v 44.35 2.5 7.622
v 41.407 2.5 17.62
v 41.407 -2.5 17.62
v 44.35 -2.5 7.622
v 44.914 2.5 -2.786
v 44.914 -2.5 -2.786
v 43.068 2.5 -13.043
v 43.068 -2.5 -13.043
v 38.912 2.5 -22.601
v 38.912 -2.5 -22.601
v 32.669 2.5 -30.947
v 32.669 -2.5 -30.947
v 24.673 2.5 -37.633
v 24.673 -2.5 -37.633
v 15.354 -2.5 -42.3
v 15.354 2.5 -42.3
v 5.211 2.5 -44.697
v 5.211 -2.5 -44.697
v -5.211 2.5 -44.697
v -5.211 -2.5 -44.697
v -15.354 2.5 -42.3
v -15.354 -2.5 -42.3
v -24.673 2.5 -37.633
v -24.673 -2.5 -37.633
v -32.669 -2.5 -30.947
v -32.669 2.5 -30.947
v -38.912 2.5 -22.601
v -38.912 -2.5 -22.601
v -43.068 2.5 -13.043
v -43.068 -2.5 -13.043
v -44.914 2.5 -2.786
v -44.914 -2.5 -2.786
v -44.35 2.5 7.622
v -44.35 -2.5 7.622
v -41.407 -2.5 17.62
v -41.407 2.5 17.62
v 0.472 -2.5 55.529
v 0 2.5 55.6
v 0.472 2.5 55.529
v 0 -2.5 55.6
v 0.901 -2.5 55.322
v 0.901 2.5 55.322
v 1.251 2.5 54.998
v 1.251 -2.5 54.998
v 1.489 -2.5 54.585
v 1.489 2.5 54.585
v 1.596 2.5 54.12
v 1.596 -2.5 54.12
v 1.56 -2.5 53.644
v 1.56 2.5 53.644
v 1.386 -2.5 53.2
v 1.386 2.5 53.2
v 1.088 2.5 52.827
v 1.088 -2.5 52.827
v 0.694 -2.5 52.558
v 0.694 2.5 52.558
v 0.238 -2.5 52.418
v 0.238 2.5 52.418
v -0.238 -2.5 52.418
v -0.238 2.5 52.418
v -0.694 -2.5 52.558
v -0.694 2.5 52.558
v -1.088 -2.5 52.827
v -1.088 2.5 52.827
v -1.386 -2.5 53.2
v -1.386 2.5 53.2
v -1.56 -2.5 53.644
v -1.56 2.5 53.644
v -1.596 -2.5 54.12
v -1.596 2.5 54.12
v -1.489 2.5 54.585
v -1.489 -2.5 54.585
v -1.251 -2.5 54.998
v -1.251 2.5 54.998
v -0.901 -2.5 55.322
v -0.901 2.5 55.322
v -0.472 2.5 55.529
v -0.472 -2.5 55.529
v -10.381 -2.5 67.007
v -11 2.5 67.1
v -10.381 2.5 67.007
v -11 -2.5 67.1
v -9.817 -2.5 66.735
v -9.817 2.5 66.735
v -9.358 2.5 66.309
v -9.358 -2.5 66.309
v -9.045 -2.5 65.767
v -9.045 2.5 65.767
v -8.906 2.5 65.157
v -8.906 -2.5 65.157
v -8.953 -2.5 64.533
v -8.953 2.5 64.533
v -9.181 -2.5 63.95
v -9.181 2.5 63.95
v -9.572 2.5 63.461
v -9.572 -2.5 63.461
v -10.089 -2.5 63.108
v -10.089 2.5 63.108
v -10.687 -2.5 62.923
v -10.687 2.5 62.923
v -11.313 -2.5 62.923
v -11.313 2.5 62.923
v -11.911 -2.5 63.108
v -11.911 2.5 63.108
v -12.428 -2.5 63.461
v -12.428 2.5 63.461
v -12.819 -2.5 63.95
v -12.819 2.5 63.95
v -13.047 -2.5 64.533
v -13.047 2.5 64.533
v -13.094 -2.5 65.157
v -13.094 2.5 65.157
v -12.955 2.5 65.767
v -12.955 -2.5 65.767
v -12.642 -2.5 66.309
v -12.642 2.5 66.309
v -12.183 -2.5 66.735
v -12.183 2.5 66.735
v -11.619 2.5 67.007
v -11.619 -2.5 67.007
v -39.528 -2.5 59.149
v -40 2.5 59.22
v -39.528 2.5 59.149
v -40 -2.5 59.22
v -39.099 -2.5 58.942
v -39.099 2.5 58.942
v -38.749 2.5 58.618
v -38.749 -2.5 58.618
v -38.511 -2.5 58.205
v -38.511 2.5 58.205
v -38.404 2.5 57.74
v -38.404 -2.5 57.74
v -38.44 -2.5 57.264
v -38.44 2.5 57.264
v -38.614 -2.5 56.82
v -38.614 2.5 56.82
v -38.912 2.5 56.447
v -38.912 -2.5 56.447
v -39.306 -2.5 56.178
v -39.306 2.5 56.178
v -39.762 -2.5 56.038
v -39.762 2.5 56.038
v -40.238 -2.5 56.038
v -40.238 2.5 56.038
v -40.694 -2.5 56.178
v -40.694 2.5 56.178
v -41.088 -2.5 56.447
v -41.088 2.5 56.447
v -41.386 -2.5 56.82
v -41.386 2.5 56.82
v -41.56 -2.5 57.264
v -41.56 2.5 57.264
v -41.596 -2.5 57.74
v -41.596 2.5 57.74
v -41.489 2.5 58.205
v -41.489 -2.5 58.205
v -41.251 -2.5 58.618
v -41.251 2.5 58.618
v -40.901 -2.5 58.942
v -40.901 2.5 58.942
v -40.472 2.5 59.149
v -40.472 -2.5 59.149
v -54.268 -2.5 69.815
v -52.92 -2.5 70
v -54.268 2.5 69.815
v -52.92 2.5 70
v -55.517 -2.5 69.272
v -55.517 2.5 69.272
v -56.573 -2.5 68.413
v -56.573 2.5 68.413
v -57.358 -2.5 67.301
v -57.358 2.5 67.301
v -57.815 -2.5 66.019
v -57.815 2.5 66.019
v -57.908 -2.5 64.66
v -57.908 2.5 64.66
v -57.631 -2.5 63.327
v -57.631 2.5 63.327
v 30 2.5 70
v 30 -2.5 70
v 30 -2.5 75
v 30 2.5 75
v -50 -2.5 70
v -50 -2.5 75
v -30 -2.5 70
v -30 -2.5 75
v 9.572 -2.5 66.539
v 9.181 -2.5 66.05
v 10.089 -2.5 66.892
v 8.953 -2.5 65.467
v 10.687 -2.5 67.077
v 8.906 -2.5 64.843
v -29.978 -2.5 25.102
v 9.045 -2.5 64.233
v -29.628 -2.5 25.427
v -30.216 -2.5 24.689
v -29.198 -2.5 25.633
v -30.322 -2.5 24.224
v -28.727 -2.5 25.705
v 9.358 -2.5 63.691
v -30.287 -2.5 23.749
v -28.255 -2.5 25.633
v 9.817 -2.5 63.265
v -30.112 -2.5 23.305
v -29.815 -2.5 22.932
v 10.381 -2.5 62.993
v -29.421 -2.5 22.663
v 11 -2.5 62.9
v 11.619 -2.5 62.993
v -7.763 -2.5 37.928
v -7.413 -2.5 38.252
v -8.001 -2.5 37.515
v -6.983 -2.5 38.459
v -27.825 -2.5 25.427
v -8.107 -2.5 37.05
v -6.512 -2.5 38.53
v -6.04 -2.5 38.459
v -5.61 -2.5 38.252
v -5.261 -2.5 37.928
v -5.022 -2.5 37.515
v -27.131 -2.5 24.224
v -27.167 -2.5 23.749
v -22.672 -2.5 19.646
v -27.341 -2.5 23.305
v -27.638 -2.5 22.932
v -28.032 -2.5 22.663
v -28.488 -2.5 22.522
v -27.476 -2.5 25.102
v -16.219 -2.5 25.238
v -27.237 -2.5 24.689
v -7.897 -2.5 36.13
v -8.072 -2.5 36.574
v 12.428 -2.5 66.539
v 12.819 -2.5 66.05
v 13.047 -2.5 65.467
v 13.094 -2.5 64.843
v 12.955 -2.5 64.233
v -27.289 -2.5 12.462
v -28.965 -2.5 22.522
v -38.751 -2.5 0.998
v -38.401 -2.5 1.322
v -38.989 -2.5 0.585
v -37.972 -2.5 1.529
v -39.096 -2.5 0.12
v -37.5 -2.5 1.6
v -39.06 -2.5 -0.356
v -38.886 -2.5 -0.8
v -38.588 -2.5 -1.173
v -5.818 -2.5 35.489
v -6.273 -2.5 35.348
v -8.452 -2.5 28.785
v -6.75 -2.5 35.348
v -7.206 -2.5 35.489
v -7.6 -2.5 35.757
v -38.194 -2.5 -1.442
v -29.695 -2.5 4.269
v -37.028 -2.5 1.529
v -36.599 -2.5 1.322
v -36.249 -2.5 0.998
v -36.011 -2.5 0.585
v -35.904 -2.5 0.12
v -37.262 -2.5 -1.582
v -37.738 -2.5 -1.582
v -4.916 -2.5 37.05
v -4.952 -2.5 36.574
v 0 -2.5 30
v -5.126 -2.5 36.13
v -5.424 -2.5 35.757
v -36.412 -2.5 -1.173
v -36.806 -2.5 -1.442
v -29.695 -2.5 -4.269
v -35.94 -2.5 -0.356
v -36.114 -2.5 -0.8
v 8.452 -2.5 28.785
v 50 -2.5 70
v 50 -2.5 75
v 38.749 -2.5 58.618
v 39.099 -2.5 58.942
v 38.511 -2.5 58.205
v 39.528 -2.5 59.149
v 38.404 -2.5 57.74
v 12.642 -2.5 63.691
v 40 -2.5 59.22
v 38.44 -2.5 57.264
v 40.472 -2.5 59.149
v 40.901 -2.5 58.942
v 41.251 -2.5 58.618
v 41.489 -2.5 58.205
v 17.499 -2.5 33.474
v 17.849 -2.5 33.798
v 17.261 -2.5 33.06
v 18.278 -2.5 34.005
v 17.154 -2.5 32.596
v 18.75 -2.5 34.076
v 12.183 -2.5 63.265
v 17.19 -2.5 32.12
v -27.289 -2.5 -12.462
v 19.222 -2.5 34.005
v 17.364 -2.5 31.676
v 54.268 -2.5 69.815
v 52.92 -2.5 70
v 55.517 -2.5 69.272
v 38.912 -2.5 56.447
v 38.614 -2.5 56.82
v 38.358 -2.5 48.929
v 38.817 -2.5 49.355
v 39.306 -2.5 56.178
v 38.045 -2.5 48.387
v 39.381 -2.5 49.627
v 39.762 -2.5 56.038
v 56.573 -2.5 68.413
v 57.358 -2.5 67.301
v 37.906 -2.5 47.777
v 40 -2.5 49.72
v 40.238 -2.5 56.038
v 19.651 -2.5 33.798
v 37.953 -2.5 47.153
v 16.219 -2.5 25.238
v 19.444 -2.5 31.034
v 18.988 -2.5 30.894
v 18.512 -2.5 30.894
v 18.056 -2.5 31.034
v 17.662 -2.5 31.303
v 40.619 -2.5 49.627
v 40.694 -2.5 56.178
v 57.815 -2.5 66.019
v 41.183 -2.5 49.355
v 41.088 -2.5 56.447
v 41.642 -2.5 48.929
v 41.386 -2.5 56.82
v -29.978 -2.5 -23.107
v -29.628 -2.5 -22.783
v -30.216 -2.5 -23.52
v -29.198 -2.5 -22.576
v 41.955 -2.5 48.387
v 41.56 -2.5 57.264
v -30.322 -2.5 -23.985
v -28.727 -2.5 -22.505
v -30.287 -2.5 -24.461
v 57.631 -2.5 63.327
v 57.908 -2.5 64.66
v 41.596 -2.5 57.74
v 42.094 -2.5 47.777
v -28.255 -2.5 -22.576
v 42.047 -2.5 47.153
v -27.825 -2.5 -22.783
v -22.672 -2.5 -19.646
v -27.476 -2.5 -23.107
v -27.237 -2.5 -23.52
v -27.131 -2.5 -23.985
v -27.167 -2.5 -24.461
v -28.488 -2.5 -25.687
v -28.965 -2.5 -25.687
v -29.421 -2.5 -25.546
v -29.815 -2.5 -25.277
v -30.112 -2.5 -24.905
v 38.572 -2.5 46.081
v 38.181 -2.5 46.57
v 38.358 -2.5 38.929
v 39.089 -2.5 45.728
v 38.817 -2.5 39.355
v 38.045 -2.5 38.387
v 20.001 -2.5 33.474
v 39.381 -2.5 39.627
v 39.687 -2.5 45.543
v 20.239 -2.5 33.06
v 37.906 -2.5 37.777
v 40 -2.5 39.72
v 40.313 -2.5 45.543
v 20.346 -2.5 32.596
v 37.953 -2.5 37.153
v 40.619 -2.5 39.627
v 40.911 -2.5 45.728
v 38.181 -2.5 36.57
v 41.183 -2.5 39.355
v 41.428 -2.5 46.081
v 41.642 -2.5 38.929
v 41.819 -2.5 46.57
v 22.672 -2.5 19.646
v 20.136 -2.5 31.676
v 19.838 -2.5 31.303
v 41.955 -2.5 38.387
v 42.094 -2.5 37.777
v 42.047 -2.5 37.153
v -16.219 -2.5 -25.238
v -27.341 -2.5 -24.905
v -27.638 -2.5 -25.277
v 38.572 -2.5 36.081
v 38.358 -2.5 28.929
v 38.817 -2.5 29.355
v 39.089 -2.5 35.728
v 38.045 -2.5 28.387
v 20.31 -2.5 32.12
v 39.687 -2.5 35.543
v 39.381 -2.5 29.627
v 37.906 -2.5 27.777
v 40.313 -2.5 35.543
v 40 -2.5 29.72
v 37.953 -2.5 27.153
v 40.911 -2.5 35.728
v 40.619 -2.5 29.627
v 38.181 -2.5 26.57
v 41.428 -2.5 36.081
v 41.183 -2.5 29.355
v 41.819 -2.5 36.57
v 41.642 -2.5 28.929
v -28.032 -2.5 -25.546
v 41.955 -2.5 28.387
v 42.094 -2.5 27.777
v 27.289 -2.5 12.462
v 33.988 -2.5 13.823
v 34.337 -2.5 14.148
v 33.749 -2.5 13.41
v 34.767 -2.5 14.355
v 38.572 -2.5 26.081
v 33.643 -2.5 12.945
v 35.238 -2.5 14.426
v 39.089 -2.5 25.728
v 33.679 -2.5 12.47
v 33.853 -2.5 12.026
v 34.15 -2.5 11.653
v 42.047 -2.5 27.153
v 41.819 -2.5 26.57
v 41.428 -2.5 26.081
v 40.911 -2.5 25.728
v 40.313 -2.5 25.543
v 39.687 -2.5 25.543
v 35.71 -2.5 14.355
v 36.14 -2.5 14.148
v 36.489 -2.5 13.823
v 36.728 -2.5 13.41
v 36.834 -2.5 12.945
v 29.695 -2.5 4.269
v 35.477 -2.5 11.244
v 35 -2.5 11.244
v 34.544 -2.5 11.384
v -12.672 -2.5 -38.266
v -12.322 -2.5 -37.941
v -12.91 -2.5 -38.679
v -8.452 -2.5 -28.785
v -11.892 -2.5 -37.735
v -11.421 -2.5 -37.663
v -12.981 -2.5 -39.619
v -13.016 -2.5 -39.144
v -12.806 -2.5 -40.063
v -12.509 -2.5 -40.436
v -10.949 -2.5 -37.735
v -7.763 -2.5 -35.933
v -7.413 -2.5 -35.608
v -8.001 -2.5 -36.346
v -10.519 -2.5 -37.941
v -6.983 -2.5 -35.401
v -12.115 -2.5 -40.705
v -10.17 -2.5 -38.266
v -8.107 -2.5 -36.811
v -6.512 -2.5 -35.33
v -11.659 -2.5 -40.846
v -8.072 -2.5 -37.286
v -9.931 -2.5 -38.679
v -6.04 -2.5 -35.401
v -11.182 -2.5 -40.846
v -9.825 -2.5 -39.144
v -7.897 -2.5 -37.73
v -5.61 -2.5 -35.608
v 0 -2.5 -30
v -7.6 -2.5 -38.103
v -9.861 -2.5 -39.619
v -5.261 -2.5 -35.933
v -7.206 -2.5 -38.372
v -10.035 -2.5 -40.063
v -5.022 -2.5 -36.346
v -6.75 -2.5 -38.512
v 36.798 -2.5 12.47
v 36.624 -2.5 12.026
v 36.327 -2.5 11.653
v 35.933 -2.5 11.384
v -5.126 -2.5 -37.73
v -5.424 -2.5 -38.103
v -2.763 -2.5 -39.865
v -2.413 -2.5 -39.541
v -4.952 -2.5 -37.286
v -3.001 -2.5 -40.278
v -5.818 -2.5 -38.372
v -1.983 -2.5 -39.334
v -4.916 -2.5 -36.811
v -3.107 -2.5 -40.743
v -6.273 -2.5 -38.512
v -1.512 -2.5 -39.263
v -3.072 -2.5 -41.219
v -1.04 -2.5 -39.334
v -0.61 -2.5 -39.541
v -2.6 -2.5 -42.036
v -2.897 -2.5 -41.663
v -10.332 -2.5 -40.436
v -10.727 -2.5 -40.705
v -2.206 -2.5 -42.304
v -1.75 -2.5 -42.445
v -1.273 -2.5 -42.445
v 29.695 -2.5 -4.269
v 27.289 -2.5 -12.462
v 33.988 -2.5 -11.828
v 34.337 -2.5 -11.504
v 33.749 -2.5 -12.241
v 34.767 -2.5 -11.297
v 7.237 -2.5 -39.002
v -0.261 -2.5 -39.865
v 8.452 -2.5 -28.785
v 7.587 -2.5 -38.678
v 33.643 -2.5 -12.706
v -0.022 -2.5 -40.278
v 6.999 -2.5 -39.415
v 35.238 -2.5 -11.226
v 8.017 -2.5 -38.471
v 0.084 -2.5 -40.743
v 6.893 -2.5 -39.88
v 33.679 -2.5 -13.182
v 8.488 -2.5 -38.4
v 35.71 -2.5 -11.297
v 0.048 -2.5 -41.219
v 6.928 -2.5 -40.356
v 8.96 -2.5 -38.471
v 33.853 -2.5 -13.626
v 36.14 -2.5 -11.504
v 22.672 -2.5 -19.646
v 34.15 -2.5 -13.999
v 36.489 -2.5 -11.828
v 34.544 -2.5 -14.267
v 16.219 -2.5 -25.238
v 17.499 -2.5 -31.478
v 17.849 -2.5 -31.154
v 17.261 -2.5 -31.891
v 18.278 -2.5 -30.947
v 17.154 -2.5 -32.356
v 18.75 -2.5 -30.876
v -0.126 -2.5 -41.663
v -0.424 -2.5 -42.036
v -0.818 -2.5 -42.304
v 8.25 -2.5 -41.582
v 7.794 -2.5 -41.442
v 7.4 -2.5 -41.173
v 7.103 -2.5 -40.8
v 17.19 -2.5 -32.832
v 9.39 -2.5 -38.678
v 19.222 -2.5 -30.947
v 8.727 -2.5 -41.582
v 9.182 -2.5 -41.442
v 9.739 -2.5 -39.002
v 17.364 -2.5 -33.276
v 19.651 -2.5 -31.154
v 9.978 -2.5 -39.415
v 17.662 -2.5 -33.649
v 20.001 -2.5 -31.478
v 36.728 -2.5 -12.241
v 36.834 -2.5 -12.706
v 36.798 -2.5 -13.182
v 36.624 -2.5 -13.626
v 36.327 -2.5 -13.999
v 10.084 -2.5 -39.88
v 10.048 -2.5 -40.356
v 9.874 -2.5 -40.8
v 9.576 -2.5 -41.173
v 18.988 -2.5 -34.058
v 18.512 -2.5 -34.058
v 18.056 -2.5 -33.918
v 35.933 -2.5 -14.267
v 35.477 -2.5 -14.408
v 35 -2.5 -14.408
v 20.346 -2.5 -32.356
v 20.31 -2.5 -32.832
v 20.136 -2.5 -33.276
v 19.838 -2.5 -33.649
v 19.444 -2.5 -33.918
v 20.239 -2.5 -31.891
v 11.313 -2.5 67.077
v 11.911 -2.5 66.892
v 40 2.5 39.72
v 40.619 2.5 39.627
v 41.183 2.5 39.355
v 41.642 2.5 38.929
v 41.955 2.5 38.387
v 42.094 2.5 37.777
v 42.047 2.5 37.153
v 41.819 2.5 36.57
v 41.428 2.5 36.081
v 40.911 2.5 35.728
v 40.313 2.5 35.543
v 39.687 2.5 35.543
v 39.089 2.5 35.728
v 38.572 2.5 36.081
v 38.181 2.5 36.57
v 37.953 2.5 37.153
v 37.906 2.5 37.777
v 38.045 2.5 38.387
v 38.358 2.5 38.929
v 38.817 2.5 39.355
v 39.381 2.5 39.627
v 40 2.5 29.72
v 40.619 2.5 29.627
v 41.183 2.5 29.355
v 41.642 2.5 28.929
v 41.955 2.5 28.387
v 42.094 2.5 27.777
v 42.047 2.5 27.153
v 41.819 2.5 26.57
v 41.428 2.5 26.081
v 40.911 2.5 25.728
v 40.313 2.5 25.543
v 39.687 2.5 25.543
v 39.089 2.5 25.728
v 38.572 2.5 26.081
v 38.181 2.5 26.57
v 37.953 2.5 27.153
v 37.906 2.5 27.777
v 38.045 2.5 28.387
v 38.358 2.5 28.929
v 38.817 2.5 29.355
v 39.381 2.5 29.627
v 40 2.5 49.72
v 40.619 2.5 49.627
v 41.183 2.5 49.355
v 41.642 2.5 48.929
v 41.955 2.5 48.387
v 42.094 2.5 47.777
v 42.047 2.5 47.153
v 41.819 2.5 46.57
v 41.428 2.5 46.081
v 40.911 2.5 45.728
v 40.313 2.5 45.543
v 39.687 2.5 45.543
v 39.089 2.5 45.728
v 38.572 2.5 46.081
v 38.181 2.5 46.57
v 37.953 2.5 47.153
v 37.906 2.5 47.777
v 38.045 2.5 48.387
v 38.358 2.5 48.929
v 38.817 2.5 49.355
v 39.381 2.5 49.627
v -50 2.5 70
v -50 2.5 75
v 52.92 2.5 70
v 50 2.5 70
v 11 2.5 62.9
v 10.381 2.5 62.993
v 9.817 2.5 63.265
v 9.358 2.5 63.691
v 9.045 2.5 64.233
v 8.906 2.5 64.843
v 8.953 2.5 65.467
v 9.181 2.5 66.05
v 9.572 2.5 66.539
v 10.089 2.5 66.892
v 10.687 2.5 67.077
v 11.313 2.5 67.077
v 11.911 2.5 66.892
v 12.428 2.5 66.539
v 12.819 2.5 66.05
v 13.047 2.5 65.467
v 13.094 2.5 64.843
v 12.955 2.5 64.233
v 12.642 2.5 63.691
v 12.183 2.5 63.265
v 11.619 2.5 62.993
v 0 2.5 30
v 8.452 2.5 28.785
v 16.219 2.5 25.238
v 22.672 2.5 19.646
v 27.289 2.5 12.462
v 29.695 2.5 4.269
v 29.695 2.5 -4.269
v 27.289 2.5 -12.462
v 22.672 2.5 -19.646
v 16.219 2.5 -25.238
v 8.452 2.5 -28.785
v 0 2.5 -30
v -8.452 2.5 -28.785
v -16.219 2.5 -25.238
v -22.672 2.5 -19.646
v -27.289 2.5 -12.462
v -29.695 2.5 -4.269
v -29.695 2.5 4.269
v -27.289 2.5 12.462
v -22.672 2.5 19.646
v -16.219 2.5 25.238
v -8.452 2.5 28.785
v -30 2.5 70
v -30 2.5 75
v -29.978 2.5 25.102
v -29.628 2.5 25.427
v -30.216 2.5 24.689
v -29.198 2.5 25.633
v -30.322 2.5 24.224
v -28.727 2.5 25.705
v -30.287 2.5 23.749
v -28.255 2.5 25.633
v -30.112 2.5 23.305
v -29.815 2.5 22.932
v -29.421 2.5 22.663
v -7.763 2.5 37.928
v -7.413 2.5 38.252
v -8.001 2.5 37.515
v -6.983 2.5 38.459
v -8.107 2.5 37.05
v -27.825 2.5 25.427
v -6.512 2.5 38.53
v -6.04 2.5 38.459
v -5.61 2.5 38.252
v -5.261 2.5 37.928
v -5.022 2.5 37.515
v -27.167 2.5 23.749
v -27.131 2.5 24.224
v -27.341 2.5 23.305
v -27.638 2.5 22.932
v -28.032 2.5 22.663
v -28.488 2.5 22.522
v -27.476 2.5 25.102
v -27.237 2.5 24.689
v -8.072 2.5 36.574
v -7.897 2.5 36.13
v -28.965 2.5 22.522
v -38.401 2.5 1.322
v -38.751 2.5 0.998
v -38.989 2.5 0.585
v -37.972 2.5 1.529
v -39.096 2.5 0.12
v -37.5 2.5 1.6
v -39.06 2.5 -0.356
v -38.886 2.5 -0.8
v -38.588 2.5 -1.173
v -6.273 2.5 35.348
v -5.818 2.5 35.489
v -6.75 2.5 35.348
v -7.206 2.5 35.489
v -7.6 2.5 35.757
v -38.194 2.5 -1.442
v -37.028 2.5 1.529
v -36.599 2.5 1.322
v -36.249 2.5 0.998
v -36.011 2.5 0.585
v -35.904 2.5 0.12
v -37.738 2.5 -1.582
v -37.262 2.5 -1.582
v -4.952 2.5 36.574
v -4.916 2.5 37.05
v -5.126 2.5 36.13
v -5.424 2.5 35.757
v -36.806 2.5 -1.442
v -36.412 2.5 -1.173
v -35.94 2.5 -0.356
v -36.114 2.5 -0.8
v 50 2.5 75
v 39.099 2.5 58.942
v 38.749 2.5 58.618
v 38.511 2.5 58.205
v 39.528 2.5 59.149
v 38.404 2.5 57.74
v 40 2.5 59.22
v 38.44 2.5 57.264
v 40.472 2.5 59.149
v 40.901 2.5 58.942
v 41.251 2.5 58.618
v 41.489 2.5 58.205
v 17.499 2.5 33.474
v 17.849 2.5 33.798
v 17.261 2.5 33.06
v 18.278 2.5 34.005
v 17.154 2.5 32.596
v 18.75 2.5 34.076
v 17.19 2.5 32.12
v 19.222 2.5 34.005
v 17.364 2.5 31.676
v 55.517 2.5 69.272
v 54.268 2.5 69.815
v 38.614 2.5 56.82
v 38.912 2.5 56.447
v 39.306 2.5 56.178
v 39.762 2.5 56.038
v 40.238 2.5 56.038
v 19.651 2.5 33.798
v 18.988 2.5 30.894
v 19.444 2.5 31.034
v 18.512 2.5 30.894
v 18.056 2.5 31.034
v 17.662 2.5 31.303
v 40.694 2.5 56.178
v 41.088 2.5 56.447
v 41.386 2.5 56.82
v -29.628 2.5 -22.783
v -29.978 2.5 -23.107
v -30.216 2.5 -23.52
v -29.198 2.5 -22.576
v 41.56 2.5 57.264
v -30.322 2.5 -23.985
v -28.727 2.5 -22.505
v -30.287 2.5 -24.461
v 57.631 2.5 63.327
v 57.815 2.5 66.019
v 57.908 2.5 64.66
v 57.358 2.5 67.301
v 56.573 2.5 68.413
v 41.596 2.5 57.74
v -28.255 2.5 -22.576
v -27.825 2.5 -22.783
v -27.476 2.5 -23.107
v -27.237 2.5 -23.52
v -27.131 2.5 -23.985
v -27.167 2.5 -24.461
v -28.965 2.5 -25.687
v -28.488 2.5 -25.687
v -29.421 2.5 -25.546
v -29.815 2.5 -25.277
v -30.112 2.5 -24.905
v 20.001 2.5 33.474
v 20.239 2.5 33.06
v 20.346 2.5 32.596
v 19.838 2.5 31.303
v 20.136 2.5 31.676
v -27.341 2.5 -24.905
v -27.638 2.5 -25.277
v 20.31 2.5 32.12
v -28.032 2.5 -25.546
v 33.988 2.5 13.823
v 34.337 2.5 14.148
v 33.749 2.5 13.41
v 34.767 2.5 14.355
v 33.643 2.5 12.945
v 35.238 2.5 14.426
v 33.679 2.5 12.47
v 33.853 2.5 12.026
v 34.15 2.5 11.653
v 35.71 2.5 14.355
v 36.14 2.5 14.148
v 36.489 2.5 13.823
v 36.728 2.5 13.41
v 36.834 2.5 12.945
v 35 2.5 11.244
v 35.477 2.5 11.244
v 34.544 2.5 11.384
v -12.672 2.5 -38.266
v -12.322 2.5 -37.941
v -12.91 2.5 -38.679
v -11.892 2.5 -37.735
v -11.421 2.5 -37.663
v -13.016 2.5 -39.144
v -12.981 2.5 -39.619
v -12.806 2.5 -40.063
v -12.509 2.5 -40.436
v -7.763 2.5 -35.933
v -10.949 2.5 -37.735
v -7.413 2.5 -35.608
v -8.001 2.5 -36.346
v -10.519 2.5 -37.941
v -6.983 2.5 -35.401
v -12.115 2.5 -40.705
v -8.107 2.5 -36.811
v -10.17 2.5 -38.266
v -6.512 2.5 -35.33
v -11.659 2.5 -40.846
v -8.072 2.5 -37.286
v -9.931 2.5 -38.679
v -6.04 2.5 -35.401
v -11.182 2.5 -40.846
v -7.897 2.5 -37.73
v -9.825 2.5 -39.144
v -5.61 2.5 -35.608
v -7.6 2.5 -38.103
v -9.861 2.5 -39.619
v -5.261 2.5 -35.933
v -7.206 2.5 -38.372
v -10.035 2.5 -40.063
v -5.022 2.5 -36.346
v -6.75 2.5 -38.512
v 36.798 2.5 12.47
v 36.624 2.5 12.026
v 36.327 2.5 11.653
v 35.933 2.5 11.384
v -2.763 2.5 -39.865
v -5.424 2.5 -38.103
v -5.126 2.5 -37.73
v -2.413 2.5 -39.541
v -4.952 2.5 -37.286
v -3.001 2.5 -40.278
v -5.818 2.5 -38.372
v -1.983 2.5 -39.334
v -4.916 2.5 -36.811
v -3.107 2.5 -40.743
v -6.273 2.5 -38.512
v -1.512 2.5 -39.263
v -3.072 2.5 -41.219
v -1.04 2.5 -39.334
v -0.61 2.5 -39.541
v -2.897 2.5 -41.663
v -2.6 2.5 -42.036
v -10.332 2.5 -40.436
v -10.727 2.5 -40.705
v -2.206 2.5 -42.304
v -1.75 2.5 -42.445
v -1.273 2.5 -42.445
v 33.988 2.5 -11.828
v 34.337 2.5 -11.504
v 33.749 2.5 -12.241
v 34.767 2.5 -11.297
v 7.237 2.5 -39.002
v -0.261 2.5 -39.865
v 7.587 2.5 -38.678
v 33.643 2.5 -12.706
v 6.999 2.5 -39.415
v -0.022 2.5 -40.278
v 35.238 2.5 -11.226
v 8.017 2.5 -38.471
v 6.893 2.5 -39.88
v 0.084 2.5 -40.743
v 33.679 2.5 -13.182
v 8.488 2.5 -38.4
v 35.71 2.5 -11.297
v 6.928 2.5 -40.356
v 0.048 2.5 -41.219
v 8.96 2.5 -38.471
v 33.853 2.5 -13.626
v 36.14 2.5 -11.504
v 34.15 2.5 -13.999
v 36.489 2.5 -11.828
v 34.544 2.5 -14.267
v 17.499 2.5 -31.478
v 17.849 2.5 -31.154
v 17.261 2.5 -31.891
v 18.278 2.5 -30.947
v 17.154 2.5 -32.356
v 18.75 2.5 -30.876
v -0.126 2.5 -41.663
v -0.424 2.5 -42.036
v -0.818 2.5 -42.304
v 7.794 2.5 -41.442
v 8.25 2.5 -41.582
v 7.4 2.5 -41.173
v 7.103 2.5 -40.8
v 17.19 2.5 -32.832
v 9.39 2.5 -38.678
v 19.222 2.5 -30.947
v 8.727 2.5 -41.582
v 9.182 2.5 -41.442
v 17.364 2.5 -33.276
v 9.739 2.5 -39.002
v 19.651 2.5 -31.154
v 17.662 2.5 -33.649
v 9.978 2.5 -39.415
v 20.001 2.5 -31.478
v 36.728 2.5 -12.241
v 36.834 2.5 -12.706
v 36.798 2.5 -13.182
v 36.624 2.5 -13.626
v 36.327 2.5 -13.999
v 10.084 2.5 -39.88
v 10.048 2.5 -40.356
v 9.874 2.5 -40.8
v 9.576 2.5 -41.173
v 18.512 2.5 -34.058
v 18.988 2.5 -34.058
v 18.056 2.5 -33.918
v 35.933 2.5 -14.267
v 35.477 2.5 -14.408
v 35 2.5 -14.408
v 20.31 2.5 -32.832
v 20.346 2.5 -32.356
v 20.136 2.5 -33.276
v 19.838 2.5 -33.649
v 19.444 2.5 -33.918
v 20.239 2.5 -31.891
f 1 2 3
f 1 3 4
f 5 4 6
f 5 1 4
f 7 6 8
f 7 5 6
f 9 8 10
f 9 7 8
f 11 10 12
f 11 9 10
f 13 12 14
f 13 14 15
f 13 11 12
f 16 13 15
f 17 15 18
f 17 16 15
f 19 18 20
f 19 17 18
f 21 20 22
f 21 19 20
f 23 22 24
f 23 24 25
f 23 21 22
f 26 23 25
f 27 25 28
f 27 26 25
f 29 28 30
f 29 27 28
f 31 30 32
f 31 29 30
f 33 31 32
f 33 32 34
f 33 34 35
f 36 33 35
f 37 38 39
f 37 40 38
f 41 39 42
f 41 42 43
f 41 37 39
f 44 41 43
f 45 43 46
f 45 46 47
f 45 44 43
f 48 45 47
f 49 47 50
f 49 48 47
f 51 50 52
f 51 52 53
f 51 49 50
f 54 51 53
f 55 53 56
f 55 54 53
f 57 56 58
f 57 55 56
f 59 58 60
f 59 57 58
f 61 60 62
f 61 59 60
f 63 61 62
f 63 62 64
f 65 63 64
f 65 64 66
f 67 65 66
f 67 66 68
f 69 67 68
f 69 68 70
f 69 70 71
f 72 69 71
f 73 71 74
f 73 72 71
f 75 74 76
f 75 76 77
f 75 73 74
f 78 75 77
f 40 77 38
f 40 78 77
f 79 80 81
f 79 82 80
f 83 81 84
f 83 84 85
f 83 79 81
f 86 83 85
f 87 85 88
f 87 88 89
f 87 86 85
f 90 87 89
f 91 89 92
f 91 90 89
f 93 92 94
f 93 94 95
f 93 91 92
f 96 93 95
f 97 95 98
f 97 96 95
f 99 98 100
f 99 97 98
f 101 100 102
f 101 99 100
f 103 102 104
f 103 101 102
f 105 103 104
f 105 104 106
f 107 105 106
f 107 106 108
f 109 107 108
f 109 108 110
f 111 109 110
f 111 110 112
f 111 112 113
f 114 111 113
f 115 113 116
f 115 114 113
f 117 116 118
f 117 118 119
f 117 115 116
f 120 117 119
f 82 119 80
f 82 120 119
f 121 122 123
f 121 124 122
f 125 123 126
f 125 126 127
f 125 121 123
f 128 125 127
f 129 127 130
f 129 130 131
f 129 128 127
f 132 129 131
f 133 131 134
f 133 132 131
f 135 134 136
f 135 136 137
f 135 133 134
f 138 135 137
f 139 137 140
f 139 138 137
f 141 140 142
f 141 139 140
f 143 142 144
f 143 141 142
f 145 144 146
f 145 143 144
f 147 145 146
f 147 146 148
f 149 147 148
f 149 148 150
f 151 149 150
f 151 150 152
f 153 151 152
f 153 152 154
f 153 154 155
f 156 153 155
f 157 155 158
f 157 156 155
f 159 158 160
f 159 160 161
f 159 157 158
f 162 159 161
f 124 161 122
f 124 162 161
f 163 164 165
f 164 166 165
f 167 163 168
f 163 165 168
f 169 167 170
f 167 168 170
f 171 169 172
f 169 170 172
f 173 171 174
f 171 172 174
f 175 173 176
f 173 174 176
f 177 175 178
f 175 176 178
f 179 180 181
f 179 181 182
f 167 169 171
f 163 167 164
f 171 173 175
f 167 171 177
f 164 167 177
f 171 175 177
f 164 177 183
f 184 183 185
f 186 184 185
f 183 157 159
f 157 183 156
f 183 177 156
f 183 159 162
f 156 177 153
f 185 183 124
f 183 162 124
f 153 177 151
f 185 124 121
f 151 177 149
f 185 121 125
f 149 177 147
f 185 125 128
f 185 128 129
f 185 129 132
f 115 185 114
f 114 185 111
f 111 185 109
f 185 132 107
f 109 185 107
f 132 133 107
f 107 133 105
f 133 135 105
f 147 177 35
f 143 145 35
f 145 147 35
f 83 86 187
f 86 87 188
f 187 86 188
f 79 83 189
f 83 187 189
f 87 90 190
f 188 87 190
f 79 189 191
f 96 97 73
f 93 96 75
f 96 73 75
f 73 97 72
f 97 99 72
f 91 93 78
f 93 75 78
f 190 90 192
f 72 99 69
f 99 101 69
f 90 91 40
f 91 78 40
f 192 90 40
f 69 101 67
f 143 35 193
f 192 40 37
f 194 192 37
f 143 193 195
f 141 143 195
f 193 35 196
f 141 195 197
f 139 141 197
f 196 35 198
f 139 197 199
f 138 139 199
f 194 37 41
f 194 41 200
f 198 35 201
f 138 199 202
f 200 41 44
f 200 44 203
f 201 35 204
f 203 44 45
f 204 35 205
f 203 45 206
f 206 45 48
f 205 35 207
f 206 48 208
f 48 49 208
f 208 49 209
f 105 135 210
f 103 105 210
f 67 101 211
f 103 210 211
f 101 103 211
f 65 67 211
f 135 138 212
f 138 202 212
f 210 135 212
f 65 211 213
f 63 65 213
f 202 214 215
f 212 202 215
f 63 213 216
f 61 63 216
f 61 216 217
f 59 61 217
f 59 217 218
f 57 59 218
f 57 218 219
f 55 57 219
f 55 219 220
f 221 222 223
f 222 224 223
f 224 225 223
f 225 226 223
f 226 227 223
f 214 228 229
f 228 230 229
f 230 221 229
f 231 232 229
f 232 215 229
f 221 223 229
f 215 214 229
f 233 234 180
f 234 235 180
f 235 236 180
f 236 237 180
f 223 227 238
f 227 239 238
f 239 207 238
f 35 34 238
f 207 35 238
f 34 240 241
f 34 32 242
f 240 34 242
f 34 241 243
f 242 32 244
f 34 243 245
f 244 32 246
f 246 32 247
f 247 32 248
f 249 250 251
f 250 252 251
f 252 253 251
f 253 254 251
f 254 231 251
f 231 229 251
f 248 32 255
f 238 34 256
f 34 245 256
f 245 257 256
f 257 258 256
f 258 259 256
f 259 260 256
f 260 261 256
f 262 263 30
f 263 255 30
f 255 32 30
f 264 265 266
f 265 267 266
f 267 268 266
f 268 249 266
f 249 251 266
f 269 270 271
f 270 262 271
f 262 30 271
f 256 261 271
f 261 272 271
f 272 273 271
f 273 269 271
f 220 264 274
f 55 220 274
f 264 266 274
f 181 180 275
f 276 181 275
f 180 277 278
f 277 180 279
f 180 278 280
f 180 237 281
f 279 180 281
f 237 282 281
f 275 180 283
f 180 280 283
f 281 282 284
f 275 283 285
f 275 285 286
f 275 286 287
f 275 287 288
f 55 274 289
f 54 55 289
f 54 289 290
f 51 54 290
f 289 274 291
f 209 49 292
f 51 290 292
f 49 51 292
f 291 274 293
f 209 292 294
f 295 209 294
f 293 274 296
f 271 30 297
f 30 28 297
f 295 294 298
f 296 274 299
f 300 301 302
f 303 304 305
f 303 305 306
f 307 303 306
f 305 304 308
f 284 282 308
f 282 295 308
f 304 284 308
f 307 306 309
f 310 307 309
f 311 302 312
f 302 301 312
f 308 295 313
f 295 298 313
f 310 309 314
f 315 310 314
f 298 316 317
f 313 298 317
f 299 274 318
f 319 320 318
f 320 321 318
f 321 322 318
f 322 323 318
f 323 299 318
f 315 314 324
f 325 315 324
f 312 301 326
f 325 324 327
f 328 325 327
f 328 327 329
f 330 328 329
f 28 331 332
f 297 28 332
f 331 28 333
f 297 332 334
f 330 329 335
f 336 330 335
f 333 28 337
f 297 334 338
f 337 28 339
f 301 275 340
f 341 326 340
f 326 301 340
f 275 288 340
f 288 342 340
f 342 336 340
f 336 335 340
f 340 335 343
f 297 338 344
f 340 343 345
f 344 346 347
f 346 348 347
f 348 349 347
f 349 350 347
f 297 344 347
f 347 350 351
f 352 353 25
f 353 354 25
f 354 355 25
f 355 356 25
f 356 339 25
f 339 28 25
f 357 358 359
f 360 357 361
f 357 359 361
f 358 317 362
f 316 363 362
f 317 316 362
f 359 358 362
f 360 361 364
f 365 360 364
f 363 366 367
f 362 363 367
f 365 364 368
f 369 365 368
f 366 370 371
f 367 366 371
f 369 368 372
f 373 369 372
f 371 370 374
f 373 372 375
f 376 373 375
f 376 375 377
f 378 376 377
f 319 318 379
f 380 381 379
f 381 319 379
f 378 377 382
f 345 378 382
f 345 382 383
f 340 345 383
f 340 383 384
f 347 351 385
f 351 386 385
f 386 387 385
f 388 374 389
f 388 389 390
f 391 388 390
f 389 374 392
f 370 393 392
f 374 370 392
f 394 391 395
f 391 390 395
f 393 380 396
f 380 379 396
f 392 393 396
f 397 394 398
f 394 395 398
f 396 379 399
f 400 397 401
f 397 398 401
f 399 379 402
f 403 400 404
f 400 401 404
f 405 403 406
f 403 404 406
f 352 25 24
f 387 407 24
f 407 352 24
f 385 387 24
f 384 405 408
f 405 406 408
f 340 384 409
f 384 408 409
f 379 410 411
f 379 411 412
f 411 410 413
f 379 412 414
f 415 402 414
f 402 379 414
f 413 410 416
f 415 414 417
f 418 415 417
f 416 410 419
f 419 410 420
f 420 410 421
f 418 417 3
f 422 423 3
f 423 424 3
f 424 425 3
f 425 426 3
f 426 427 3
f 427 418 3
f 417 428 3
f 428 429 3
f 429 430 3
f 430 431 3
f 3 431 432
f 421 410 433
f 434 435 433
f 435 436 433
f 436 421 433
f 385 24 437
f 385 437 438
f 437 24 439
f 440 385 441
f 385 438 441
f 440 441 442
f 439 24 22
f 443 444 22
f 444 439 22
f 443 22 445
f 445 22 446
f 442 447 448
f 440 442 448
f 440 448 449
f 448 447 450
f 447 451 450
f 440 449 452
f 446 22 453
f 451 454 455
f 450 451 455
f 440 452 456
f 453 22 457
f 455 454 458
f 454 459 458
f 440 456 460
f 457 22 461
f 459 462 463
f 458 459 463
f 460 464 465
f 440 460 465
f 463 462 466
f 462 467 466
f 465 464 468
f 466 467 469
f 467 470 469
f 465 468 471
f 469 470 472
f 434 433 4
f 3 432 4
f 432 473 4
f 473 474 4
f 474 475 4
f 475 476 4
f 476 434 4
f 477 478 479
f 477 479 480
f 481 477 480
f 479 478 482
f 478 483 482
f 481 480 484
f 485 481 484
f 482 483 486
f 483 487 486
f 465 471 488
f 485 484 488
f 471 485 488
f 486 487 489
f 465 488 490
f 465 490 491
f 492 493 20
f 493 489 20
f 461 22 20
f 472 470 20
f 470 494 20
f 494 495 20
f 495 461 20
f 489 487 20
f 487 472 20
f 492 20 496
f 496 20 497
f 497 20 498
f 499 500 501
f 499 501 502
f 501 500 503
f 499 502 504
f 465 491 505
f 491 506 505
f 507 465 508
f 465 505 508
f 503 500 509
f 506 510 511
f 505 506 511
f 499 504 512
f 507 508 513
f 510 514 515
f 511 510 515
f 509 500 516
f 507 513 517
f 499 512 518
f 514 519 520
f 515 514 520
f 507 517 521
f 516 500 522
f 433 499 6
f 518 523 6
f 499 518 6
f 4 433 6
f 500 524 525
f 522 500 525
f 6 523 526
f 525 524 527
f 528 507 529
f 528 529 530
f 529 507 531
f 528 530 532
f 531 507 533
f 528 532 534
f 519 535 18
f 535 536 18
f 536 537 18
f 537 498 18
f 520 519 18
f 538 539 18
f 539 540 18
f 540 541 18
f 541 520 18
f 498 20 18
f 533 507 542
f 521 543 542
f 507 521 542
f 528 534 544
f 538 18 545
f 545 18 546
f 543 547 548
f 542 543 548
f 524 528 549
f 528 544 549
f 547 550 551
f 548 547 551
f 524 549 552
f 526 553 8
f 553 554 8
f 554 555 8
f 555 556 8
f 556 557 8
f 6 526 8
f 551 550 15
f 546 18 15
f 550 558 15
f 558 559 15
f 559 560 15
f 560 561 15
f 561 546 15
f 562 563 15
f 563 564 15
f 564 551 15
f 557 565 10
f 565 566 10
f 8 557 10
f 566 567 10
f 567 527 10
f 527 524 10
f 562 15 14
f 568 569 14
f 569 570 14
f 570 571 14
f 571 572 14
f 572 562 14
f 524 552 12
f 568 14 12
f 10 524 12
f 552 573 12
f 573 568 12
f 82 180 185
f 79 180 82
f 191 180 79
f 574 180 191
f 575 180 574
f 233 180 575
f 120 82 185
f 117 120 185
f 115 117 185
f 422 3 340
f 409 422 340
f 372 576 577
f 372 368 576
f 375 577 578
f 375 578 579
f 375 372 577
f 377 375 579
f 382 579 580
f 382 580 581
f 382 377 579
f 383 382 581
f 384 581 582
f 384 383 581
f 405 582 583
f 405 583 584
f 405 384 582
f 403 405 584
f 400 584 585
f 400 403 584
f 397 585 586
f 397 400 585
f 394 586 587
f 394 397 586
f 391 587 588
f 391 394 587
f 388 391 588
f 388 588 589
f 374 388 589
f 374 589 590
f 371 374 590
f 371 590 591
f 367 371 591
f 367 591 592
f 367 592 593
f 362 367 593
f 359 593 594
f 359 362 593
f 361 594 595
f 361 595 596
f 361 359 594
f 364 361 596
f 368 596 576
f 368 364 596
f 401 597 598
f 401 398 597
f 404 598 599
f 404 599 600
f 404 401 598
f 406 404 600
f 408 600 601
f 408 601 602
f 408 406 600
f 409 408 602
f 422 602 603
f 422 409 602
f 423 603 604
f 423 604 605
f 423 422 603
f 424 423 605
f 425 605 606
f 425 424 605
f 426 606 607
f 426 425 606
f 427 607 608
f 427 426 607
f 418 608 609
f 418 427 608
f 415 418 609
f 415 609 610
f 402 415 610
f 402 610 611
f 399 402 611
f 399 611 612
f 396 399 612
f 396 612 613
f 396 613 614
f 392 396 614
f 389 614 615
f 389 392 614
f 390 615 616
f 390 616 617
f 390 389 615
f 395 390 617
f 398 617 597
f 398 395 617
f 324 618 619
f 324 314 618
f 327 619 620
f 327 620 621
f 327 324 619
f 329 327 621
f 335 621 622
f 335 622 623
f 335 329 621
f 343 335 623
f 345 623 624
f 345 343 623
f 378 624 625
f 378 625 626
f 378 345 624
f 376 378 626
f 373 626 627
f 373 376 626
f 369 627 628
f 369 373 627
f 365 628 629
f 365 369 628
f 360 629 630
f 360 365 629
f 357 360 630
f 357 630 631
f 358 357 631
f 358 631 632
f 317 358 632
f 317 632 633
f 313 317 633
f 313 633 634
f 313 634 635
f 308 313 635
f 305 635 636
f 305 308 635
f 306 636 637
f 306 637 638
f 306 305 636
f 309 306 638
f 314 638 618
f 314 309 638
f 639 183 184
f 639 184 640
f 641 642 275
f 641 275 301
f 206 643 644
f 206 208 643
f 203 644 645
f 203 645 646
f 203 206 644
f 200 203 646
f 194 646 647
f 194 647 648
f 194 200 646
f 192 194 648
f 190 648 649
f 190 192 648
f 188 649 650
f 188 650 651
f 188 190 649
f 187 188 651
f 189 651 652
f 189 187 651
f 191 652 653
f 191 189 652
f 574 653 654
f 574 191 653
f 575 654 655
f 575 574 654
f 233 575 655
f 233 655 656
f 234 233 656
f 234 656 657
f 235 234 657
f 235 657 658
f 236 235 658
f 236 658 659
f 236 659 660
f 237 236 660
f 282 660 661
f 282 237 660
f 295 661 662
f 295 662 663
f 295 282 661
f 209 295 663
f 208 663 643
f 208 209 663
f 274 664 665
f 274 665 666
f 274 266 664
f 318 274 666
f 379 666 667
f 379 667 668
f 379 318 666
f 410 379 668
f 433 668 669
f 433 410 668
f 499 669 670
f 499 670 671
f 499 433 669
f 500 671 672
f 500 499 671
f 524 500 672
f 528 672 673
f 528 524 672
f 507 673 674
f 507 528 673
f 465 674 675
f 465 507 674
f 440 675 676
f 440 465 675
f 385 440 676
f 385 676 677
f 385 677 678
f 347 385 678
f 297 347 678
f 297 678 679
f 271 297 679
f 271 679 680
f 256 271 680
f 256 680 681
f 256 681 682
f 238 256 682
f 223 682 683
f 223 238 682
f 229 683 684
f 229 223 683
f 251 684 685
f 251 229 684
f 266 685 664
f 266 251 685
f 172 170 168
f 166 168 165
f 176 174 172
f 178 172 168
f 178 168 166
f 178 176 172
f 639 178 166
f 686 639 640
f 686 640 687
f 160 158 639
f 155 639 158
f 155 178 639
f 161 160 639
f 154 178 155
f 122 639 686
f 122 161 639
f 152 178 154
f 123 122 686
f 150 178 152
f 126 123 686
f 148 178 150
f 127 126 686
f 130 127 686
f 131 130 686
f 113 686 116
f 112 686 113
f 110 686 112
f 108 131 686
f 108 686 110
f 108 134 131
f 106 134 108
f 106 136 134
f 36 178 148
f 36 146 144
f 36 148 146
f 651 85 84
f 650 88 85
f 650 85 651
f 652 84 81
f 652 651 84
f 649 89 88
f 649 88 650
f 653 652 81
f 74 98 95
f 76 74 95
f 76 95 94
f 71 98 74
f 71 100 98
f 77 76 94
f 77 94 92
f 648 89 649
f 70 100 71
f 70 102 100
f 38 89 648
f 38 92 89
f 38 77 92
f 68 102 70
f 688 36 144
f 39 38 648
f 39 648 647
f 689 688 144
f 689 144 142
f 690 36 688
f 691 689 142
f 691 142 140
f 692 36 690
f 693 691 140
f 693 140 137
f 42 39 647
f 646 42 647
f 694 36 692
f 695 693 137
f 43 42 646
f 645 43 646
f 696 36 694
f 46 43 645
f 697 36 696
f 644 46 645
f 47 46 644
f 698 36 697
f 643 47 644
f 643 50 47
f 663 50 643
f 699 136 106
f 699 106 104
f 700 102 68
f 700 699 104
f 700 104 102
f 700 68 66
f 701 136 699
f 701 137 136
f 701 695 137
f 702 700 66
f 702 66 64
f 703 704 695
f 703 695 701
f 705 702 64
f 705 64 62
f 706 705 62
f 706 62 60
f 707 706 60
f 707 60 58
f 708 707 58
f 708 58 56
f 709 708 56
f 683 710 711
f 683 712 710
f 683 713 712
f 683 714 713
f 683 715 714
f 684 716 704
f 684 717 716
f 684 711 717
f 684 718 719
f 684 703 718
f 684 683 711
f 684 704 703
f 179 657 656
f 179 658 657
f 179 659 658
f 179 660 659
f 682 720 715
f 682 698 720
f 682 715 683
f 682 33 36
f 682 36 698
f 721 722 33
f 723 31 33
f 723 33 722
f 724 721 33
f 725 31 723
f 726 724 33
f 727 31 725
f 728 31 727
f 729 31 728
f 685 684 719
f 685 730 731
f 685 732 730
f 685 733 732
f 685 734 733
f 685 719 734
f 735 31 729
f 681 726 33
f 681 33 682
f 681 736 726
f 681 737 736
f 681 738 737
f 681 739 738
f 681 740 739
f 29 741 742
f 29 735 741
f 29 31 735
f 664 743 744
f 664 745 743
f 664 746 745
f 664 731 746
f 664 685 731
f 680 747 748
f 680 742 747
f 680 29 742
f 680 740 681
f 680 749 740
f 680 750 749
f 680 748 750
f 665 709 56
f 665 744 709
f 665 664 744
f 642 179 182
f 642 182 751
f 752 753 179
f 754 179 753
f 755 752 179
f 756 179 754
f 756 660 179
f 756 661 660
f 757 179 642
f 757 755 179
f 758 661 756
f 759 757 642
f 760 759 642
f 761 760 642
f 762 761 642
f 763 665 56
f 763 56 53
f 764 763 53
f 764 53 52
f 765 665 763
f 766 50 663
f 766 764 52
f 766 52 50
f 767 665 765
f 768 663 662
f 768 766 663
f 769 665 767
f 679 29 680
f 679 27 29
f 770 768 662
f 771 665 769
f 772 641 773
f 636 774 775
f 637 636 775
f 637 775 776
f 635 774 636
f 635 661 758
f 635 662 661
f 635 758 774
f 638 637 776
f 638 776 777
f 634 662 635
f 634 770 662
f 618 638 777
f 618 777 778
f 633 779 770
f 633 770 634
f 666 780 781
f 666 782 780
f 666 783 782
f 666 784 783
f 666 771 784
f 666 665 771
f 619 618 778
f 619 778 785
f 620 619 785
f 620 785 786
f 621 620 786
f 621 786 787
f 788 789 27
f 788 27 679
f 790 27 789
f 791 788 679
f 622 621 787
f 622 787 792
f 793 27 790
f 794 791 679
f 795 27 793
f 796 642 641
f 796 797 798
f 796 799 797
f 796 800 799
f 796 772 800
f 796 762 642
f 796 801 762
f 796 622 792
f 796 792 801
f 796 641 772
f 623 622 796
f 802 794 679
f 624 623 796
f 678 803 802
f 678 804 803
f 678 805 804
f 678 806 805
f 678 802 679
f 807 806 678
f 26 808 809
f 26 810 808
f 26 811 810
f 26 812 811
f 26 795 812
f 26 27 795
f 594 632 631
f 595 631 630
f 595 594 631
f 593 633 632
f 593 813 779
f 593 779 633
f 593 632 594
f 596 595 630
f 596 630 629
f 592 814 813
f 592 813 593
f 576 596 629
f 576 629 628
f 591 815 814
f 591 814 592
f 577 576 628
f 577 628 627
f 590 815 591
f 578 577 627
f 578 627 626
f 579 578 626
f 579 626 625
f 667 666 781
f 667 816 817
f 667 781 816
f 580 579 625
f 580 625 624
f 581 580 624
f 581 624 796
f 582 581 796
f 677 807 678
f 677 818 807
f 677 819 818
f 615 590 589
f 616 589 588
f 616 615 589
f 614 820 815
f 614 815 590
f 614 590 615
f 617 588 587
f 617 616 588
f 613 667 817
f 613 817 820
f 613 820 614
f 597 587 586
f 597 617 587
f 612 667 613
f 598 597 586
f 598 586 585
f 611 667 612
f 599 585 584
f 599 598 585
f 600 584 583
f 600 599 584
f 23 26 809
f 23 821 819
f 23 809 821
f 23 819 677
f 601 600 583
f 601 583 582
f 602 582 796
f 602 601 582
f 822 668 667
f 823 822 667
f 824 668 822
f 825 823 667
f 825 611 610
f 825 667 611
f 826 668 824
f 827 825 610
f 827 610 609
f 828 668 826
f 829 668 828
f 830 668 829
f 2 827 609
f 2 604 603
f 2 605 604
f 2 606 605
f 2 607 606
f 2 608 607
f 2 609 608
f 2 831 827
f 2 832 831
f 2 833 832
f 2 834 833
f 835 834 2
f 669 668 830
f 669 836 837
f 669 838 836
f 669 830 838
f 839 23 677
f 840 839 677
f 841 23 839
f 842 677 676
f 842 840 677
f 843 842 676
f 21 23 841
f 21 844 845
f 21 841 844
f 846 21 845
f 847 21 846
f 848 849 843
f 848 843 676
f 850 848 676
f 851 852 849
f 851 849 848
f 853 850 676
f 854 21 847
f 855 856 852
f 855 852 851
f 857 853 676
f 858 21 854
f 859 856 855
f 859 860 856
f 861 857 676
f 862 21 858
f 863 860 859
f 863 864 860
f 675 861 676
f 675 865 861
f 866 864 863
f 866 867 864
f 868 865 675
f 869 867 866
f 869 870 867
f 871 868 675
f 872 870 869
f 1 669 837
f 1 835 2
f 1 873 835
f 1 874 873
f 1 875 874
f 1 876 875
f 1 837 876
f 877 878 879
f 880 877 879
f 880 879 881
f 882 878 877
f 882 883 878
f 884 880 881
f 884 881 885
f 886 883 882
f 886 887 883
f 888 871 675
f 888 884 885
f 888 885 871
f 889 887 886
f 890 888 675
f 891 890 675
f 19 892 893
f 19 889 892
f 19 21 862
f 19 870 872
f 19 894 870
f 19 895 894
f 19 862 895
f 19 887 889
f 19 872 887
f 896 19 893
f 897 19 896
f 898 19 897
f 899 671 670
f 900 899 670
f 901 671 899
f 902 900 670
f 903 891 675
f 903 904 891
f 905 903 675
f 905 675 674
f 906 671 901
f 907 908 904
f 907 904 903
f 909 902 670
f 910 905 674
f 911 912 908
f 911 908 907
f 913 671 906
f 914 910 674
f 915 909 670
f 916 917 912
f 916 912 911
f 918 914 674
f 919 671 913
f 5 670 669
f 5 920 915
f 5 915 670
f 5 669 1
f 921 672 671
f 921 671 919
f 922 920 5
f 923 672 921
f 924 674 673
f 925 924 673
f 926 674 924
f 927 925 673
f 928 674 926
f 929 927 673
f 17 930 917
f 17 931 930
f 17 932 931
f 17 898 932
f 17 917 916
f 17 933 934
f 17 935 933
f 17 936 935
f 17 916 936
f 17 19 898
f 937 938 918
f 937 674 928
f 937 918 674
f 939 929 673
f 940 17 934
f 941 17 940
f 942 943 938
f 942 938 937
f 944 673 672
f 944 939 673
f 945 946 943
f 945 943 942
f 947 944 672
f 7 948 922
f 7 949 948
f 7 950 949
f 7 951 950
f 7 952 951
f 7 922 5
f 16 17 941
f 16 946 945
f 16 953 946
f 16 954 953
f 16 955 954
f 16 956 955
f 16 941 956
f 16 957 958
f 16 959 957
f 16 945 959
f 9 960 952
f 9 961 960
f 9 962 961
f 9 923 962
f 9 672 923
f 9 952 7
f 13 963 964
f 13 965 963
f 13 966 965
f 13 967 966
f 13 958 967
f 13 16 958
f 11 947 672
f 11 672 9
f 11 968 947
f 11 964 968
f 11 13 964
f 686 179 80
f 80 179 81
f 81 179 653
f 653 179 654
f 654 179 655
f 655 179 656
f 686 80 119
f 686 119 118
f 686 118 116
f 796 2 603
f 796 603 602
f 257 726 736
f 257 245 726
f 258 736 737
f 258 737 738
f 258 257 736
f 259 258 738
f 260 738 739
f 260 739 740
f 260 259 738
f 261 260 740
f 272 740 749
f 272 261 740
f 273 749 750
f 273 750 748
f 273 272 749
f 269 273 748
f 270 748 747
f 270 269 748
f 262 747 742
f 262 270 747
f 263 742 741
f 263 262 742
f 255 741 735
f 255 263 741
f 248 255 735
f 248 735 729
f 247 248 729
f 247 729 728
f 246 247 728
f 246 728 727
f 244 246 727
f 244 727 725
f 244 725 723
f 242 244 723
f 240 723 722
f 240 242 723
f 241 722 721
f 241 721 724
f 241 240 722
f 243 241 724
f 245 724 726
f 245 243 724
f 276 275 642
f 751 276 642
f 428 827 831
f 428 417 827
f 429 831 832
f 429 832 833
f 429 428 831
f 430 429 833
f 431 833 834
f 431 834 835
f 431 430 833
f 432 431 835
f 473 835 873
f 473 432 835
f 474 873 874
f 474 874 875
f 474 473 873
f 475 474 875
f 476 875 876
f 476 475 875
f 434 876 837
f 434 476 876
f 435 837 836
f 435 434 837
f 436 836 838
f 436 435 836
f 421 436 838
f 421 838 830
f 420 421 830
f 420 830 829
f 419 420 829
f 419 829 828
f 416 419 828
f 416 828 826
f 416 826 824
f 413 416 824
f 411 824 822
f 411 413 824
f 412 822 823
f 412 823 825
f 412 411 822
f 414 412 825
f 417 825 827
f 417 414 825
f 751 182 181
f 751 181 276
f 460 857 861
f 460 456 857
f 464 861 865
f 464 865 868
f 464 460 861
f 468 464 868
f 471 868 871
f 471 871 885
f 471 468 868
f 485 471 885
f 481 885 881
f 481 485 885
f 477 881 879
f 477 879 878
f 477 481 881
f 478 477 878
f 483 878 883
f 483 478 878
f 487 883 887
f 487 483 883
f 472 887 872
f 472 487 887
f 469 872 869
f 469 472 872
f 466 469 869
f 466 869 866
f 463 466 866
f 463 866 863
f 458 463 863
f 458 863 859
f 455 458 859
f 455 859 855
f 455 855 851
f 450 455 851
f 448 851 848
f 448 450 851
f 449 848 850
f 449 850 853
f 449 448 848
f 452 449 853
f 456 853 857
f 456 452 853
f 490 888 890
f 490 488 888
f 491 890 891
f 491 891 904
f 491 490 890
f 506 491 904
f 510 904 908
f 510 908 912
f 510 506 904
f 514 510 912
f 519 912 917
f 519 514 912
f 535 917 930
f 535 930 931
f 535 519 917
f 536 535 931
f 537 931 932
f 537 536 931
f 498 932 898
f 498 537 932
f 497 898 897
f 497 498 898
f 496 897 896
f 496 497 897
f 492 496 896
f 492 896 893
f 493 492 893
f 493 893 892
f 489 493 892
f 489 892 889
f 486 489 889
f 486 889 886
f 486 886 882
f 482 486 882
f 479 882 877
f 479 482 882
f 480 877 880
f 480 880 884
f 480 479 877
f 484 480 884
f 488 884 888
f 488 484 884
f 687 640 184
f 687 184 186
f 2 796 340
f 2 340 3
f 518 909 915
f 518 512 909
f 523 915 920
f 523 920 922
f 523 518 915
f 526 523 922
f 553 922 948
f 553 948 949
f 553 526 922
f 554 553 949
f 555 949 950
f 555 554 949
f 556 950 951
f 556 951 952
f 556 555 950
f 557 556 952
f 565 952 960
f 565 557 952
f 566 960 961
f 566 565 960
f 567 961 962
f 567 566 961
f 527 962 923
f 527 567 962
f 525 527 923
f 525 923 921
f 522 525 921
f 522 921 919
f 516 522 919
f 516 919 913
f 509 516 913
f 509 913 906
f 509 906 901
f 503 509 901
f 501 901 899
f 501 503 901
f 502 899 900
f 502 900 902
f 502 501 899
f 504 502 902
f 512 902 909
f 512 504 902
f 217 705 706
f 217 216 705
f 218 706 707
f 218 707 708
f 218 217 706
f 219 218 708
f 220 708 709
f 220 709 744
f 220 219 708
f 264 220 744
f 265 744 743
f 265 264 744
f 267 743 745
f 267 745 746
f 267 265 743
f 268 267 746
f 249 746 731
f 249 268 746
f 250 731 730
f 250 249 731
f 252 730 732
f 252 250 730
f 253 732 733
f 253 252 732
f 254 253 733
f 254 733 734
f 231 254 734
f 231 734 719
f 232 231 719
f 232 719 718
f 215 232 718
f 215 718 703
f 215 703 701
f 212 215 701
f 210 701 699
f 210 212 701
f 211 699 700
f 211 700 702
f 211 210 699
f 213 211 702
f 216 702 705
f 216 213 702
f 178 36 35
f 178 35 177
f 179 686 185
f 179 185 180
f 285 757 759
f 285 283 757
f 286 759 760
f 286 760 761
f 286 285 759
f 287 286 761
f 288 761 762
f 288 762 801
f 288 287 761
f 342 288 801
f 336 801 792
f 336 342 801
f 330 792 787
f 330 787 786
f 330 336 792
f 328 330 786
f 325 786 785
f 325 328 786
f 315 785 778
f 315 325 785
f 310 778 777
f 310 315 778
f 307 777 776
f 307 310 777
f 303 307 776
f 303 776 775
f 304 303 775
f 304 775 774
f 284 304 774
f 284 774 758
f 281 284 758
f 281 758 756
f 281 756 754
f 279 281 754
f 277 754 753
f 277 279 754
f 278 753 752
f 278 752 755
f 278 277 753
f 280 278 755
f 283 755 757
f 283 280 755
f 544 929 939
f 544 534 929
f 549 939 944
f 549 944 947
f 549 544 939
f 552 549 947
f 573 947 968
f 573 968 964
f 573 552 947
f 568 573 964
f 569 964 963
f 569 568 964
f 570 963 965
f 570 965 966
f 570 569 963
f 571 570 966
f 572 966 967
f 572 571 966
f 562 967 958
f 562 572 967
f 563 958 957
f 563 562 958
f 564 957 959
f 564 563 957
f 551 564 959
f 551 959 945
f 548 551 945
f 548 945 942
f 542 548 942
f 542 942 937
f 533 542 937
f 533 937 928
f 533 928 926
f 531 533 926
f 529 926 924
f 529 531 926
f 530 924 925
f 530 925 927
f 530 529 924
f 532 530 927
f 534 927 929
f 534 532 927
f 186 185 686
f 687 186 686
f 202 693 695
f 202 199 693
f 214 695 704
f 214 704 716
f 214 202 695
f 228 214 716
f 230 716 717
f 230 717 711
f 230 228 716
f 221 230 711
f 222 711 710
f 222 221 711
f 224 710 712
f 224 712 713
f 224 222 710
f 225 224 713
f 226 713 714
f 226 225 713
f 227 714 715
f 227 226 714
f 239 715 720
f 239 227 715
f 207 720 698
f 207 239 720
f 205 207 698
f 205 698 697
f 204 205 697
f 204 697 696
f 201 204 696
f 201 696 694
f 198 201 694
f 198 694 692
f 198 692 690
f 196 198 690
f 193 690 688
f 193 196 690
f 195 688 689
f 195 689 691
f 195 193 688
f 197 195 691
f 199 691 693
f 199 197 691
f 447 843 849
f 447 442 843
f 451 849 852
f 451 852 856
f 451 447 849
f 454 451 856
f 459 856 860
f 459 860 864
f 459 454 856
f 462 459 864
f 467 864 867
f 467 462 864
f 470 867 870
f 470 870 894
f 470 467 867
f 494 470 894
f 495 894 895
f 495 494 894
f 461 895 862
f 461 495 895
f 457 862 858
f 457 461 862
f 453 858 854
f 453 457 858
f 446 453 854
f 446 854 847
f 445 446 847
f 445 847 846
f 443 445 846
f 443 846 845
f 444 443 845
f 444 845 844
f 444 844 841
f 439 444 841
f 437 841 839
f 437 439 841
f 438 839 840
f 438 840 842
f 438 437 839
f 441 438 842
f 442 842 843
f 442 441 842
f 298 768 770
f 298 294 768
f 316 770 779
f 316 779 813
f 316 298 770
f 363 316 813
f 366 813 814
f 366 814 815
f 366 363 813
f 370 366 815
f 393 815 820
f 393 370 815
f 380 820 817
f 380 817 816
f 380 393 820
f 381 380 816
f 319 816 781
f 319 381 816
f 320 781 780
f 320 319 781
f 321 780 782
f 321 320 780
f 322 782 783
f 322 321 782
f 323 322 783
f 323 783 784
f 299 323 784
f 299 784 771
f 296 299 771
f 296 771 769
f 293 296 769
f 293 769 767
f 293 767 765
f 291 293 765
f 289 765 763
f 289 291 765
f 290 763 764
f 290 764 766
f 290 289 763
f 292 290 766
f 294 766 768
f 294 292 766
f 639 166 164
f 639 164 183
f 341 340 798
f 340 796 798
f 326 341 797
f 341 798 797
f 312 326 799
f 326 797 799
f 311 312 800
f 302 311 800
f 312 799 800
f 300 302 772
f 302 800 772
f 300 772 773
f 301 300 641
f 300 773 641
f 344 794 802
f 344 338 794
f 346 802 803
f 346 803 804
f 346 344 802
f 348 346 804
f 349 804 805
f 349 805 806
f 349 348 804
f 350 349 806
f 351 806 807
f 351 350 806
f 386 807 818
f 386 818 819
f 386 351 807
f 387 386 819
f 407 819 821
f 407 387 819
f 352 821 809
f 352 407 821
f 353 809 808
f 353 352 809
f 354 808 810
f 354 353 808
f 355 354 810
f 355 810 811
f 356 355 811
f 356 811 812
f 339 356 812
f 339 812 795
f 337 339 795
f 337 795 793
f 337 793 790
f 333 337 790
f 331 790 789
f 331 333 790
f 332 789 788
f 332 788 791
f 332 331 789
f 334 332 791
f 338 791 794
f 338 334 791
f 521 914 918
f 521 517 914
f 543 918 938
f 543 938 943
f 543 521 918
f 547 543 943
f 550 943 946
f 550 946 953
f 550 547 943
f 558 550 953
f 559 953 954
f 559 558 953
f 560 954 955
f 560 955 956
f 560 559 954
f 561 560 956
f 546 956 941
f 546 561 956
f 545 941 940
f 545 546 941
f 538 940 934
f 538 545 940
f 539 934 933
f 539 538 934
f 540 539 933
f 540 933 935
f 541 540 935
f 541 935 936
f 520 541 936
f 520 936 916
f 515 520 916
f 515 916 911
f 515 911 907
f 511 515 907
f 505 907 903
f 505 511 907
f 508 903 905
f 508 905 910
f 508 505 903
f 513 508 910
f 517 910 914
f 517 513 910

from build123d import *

# Parameters (mm, degrees)
SKETCH_1_R          = 1.6
SKETCH_1_R_2        = 30
SKETCH_1_R_3        = 2.1
EXTRUDE_1_DEPTH     = 2.5
SKETCH_2_W          = 20
SKETCH_2_H          = 5
EXTRUDE_2_DEPTH     = 5
CUT_EXTRUDE_1_DEPTH = 97.176920308
FILLET_1_R          = 5


with BuildPart() as part:
    # 草图1 → 凸台-拉伸1 (new, symmetric)
    with BuildSketch(Plane(origin=(0, 0, 0), x_dir=(1, 0, 0), z_dir=(0, 1, 0))):
        with BuildLine():
            Line((-60, 0), (-60, -70))
            Line((-60, -70), (60, -70))
            Line((60, -70), (60, 0))
            ThreePointArc((60, 0), (42.426406871, 42.426406871), (0, 60))
            ThreePointArc((0, 60), (-42.426406871, 42.426406871), (-60, 0))
        make_face()
        with Locations(Location((-37.5, 0, 0), (0, 0, 270))):
            Circle(SKETCH_1_R, mode=Mode.SUBTRACT)
        with Locations(Location((-40, -57.62, 0), (0, 0, 270))):
            Circle(SKETCH_1_R, mode=Mode.SUBTRACT)
        with Locations(Location((40, -57.62, 0), (0, 0, 270))):
            Circle(SKETCH_1_R, mode=Mode.SUBTRACT)
        with Locations(Location((0, 0, 0), (0, 0, 270))):
            Circle(SKETCH_1_R_2, mode=Mode.SUBTRACT)
        with Locations(Location((-28.726666617, 24.104535363, 0), (0, 0, 270))):
            Circle(SKETCH_1_R, mode=Mode.SUBTRACT)
        with Locations(Location((-6.511806663, 36.930290738, 0), (0, 0, 270))):
            Circle(SKETCH_1_R, mode=Mode.SUBTRACT)
        with Locations(Location((18.75, 32.475952642, 0), (0, 0, 270))):
            Circle(SKETCH_1_R, mode=Mode.SUBTRACT)
        with Locations(Location((35.238473279, 12.825755375, 0), (0, 0, 270))):
            Circle(SKETCH_1_R, mode=Mode.SUBTRACT)
        with Locations(Location((35.238473279, -12.825755375, 0), (0, 0, 270))):
            Circle(SKETCH_1_R, mode=Mode.SUBTRACT)
        with Locations(Location((18.75, -32.475952642, 0), (0, 0, 270))):
            Circle(SKETCH_1_R, mode=Mode.SUBTRACT)
        with Locations(Location((-6.511806663, -36.930290738, 0), (0, 0, 270))):
            Circle(SKETCH_1_R, mode=Mode.SUBTRACT)
        with Locations(Location((-28.726666617, -24.104535363, 0), (0, 0, 270))):
            Circle(SKETCH_1_R, mode=Mode.SUBTRACT)
        with Locations(Location((-11, -65, 0), (0, 0, 270))):
            Circle(SKETCH_1_R_3, mode=Mode.SUBTRACT)
        with Locations(Location((11, -65, 0), (0, 0, 90))):
            Circle(SKETCH_1_R_3, mode=Mode.SUBTRACT)
        with Locations(Location((40, -47.62, 0), (0, 0, 270))):
            Circle(SKETCH_1_R_3, mode=Mode.SUBTRACT)
        with Locations(Location((40, -37.62, 0), (0, 0, 270))):
            Circle(SKETCH_1_R_3, mode=Mode.SUBTRACT)
        with Locations(Location((40, -27.62, 0), (0, 0, 270))):
            Circle(SKETCH_1_R_3, mode=Mode.SUBTRACT)
        with Locations(Location((0, -54, 0), (0, 0, 270))):
            Circle(SKETCH_1_R, mode=Mode.SUBTRACT)
        with Locations(Location((8.488193337, 40, 0), (0, 0, 270))):
            Circle(SKETCH_1_R, mode=Mode.SUBTRACT)
        with Locations(Location((-1.511806663, 40.862744239, 0), (0, 0, 270))):
            Circle(SKETCH_1_R, mode=Mode.SUBTRACT)
        with Locations(Location((-11.420717282, 39.263426275, 0), (0, 0, 270))):
            Circle(SKETCH_1_R, mode=Mode.SUBTRACT)
    extrude(amount=EXTRUDE_1_DEPTH, both=True)

    # 草图2 → 凸台-拉伸2 (add)
    with BuildSketch(Plane.XY.offset(70)):
        with Locations((40, 0)):
            Rectangle(SKETCH_2_W, SKETCH_2_H)
        with Locations((-40, 0)):
            Rectangle(SKETCH_2_W, SKETCH_2_H)
    extrude(amount=EXTRUDE_2_DEPTH)

    # 草图3 → 切除-拉伸1 (cut, through all)
    with BuildSketch(Plane(origin=(0, 2.5, 0), x_dir=(1, 0, 0), z_dir=(0, 1, 0))):
        with BuildLine():
            ThreePointArc((41.406951107, -17.62), (0, 45), (-41.406951107, -17.62))
            Line((-41.406951107, -17.62), (-60, -70))
            Line((-60, -70), (-60, 0))
            ThreePointArc((-60, 0), (0, 60), (60, 0))
            Line((60, 0), (60, -70))
            Line((60, -70), (41.406951107, -17.62))
        make_face()
    extrude(amount=-CUT_EXTRUDE_1_DEPTH, mode=Mode.SUBTRACT)

    # 圆角1
    fillet_1_edges = [part.edges().sort_by_distance(p)[0] for p in [
        (60, 0, 70),
        (-60, 0, 70),
    ]]
    fillet(fillet_1_edges, radius=FILLET_1_R)


solid = part.part
